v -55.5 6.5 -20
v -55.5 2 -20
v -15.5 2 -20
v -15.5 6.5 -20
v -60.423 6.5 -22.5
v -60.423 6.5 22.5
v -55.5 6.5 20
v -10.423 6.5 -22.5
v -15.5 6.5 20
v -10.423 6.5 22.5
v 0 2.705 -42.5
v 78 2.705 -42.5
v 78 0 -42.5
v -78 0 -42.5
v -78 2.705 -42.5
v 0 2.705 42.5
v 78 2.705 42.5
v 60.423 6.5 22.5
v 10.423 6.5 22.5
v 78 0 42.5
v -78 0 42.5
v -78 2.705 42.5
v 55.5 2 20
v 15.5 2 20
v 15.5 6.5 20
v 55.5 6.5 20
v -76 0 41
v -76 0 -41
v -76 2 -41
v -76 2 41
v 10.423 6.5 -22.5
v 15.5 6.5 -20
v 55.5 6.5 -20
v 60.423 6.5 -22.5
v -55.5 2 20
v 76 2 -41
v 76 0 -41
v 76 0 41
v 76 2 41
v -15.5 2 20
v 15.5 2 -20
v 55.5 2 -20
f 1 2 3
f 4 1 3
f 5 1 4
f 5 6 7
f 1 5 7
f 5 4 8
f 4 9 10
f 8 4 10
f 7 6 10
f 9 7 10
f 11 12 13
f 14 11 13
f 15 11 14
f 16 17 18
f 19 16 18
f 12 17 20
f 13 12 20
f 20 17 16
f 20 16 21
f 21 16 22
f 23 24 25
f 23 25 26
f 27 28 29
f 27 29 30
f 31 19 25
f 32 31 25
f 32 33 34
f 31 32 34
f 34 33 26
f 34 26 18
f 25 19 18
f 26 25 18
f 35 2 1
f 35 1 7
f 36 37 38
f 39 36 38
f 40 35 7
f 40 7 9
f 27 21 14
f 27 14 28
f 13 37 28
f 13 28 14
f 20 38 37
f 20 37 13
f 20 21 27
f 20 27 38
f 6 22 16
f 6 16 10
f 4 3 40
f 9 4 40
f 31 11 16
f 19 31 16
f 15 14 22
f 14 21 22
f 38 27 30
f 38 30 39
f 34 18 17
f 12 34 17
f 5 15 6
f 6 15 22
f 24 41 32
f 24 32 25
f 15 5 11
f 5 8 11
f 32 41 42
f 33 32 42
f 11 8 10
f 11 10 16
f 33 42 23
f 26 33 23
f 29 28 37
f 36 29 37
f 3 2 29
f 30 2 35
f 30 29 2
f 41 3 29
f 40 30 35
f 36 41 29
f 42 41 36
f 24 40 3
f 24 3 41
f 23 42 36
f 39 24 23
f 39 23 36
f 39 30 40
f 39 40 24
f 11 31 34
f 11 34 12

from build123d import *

# Parameters (mm, degrees)
EXTRUDE_1_DEPTH     = 42.5
SKETCH_2_OUTSIDE_W  = 122.554
SKETCH_2_OUTSIDE_H  = 44.054
CUT_EXTRUDE_1_DEPTH = 78
SKETCH_3_W          = 40
SKETCH_3_H          = 40
CUT_EXTRUDE_2_DEPTH = 7.5
SKETCH_4_W          = 152
SKETCH_4_H          = 82
CUT_EXTRUDE_3_DEPTH = 2


with BuildPart() as part:
    # Эскиз1 → Бобышка-Вытянуть1 (new body, symmetric)
    with BuildSketch(Plane.XY):
        Polygon((0, 0), (-78, 0), (-78, 2.705180544), (-60.423159652, 6.5), (-10.423159652, 6.5), (0, 2.705180544), (10.423159652, 6.5), (60.423159652, 6.5), (78, 2.705180544), (78, 0), align=None)
    extrude(amount=EXTRUDE_1_DEPTH, both=True)

    # Эскиз2 outside → Вырез-Вытянуть1 (cut, symmetric)
    with BuildSketch(Plane(origin=(0, 0, 0), x_dir=(0, 0, -1), z_dir=(1, 0, 0))):
        with Locations((0, 3.25)):
            Rectangle(SKETCH_2_OUTSIDE_W, SKETCH_2_OUTSIDE_H)
        Polygon((42.5, 0), (-42.5, 0), (-42.5, 2.705180544), (-22.5, 6.5), (22.5, 6.5), (42.5, 2.705180544), align=None, mode=Mode.SUBTRACT)
    extrude(amount=CUT_EXTRUDE_1_DEPTH, both=True, mode=Mode.SUBTRACT)

    # Эскиз3 → Вырез-Вытянуть2 (cut, through all)
    with BuildSketch(Plane.XZ):
        with Locations((-35.5, 0)):
            Rectangle(SKETCH_3_W, SKETCH_3_H)
        with Locations((35.5, 0)):
            Rectangle(SKETCH_3_W, SKETCH_3_H)
    extrude(amount=-CUT_EXTRUDE_2_DEPTH, mode=Mode.SUBTRACT)

    # Эскиз4 → Вырез-Вытянуть3 (cut)
    with BuildSketch(Plane.XZ):
        Rectangle(SKETCH_4_W, SKETCH_4_H)
    extrude(amount=-CUT_EXTRUDE_3_DEPTH, mode=Mode.SUBTRACT)


solid = part.part
